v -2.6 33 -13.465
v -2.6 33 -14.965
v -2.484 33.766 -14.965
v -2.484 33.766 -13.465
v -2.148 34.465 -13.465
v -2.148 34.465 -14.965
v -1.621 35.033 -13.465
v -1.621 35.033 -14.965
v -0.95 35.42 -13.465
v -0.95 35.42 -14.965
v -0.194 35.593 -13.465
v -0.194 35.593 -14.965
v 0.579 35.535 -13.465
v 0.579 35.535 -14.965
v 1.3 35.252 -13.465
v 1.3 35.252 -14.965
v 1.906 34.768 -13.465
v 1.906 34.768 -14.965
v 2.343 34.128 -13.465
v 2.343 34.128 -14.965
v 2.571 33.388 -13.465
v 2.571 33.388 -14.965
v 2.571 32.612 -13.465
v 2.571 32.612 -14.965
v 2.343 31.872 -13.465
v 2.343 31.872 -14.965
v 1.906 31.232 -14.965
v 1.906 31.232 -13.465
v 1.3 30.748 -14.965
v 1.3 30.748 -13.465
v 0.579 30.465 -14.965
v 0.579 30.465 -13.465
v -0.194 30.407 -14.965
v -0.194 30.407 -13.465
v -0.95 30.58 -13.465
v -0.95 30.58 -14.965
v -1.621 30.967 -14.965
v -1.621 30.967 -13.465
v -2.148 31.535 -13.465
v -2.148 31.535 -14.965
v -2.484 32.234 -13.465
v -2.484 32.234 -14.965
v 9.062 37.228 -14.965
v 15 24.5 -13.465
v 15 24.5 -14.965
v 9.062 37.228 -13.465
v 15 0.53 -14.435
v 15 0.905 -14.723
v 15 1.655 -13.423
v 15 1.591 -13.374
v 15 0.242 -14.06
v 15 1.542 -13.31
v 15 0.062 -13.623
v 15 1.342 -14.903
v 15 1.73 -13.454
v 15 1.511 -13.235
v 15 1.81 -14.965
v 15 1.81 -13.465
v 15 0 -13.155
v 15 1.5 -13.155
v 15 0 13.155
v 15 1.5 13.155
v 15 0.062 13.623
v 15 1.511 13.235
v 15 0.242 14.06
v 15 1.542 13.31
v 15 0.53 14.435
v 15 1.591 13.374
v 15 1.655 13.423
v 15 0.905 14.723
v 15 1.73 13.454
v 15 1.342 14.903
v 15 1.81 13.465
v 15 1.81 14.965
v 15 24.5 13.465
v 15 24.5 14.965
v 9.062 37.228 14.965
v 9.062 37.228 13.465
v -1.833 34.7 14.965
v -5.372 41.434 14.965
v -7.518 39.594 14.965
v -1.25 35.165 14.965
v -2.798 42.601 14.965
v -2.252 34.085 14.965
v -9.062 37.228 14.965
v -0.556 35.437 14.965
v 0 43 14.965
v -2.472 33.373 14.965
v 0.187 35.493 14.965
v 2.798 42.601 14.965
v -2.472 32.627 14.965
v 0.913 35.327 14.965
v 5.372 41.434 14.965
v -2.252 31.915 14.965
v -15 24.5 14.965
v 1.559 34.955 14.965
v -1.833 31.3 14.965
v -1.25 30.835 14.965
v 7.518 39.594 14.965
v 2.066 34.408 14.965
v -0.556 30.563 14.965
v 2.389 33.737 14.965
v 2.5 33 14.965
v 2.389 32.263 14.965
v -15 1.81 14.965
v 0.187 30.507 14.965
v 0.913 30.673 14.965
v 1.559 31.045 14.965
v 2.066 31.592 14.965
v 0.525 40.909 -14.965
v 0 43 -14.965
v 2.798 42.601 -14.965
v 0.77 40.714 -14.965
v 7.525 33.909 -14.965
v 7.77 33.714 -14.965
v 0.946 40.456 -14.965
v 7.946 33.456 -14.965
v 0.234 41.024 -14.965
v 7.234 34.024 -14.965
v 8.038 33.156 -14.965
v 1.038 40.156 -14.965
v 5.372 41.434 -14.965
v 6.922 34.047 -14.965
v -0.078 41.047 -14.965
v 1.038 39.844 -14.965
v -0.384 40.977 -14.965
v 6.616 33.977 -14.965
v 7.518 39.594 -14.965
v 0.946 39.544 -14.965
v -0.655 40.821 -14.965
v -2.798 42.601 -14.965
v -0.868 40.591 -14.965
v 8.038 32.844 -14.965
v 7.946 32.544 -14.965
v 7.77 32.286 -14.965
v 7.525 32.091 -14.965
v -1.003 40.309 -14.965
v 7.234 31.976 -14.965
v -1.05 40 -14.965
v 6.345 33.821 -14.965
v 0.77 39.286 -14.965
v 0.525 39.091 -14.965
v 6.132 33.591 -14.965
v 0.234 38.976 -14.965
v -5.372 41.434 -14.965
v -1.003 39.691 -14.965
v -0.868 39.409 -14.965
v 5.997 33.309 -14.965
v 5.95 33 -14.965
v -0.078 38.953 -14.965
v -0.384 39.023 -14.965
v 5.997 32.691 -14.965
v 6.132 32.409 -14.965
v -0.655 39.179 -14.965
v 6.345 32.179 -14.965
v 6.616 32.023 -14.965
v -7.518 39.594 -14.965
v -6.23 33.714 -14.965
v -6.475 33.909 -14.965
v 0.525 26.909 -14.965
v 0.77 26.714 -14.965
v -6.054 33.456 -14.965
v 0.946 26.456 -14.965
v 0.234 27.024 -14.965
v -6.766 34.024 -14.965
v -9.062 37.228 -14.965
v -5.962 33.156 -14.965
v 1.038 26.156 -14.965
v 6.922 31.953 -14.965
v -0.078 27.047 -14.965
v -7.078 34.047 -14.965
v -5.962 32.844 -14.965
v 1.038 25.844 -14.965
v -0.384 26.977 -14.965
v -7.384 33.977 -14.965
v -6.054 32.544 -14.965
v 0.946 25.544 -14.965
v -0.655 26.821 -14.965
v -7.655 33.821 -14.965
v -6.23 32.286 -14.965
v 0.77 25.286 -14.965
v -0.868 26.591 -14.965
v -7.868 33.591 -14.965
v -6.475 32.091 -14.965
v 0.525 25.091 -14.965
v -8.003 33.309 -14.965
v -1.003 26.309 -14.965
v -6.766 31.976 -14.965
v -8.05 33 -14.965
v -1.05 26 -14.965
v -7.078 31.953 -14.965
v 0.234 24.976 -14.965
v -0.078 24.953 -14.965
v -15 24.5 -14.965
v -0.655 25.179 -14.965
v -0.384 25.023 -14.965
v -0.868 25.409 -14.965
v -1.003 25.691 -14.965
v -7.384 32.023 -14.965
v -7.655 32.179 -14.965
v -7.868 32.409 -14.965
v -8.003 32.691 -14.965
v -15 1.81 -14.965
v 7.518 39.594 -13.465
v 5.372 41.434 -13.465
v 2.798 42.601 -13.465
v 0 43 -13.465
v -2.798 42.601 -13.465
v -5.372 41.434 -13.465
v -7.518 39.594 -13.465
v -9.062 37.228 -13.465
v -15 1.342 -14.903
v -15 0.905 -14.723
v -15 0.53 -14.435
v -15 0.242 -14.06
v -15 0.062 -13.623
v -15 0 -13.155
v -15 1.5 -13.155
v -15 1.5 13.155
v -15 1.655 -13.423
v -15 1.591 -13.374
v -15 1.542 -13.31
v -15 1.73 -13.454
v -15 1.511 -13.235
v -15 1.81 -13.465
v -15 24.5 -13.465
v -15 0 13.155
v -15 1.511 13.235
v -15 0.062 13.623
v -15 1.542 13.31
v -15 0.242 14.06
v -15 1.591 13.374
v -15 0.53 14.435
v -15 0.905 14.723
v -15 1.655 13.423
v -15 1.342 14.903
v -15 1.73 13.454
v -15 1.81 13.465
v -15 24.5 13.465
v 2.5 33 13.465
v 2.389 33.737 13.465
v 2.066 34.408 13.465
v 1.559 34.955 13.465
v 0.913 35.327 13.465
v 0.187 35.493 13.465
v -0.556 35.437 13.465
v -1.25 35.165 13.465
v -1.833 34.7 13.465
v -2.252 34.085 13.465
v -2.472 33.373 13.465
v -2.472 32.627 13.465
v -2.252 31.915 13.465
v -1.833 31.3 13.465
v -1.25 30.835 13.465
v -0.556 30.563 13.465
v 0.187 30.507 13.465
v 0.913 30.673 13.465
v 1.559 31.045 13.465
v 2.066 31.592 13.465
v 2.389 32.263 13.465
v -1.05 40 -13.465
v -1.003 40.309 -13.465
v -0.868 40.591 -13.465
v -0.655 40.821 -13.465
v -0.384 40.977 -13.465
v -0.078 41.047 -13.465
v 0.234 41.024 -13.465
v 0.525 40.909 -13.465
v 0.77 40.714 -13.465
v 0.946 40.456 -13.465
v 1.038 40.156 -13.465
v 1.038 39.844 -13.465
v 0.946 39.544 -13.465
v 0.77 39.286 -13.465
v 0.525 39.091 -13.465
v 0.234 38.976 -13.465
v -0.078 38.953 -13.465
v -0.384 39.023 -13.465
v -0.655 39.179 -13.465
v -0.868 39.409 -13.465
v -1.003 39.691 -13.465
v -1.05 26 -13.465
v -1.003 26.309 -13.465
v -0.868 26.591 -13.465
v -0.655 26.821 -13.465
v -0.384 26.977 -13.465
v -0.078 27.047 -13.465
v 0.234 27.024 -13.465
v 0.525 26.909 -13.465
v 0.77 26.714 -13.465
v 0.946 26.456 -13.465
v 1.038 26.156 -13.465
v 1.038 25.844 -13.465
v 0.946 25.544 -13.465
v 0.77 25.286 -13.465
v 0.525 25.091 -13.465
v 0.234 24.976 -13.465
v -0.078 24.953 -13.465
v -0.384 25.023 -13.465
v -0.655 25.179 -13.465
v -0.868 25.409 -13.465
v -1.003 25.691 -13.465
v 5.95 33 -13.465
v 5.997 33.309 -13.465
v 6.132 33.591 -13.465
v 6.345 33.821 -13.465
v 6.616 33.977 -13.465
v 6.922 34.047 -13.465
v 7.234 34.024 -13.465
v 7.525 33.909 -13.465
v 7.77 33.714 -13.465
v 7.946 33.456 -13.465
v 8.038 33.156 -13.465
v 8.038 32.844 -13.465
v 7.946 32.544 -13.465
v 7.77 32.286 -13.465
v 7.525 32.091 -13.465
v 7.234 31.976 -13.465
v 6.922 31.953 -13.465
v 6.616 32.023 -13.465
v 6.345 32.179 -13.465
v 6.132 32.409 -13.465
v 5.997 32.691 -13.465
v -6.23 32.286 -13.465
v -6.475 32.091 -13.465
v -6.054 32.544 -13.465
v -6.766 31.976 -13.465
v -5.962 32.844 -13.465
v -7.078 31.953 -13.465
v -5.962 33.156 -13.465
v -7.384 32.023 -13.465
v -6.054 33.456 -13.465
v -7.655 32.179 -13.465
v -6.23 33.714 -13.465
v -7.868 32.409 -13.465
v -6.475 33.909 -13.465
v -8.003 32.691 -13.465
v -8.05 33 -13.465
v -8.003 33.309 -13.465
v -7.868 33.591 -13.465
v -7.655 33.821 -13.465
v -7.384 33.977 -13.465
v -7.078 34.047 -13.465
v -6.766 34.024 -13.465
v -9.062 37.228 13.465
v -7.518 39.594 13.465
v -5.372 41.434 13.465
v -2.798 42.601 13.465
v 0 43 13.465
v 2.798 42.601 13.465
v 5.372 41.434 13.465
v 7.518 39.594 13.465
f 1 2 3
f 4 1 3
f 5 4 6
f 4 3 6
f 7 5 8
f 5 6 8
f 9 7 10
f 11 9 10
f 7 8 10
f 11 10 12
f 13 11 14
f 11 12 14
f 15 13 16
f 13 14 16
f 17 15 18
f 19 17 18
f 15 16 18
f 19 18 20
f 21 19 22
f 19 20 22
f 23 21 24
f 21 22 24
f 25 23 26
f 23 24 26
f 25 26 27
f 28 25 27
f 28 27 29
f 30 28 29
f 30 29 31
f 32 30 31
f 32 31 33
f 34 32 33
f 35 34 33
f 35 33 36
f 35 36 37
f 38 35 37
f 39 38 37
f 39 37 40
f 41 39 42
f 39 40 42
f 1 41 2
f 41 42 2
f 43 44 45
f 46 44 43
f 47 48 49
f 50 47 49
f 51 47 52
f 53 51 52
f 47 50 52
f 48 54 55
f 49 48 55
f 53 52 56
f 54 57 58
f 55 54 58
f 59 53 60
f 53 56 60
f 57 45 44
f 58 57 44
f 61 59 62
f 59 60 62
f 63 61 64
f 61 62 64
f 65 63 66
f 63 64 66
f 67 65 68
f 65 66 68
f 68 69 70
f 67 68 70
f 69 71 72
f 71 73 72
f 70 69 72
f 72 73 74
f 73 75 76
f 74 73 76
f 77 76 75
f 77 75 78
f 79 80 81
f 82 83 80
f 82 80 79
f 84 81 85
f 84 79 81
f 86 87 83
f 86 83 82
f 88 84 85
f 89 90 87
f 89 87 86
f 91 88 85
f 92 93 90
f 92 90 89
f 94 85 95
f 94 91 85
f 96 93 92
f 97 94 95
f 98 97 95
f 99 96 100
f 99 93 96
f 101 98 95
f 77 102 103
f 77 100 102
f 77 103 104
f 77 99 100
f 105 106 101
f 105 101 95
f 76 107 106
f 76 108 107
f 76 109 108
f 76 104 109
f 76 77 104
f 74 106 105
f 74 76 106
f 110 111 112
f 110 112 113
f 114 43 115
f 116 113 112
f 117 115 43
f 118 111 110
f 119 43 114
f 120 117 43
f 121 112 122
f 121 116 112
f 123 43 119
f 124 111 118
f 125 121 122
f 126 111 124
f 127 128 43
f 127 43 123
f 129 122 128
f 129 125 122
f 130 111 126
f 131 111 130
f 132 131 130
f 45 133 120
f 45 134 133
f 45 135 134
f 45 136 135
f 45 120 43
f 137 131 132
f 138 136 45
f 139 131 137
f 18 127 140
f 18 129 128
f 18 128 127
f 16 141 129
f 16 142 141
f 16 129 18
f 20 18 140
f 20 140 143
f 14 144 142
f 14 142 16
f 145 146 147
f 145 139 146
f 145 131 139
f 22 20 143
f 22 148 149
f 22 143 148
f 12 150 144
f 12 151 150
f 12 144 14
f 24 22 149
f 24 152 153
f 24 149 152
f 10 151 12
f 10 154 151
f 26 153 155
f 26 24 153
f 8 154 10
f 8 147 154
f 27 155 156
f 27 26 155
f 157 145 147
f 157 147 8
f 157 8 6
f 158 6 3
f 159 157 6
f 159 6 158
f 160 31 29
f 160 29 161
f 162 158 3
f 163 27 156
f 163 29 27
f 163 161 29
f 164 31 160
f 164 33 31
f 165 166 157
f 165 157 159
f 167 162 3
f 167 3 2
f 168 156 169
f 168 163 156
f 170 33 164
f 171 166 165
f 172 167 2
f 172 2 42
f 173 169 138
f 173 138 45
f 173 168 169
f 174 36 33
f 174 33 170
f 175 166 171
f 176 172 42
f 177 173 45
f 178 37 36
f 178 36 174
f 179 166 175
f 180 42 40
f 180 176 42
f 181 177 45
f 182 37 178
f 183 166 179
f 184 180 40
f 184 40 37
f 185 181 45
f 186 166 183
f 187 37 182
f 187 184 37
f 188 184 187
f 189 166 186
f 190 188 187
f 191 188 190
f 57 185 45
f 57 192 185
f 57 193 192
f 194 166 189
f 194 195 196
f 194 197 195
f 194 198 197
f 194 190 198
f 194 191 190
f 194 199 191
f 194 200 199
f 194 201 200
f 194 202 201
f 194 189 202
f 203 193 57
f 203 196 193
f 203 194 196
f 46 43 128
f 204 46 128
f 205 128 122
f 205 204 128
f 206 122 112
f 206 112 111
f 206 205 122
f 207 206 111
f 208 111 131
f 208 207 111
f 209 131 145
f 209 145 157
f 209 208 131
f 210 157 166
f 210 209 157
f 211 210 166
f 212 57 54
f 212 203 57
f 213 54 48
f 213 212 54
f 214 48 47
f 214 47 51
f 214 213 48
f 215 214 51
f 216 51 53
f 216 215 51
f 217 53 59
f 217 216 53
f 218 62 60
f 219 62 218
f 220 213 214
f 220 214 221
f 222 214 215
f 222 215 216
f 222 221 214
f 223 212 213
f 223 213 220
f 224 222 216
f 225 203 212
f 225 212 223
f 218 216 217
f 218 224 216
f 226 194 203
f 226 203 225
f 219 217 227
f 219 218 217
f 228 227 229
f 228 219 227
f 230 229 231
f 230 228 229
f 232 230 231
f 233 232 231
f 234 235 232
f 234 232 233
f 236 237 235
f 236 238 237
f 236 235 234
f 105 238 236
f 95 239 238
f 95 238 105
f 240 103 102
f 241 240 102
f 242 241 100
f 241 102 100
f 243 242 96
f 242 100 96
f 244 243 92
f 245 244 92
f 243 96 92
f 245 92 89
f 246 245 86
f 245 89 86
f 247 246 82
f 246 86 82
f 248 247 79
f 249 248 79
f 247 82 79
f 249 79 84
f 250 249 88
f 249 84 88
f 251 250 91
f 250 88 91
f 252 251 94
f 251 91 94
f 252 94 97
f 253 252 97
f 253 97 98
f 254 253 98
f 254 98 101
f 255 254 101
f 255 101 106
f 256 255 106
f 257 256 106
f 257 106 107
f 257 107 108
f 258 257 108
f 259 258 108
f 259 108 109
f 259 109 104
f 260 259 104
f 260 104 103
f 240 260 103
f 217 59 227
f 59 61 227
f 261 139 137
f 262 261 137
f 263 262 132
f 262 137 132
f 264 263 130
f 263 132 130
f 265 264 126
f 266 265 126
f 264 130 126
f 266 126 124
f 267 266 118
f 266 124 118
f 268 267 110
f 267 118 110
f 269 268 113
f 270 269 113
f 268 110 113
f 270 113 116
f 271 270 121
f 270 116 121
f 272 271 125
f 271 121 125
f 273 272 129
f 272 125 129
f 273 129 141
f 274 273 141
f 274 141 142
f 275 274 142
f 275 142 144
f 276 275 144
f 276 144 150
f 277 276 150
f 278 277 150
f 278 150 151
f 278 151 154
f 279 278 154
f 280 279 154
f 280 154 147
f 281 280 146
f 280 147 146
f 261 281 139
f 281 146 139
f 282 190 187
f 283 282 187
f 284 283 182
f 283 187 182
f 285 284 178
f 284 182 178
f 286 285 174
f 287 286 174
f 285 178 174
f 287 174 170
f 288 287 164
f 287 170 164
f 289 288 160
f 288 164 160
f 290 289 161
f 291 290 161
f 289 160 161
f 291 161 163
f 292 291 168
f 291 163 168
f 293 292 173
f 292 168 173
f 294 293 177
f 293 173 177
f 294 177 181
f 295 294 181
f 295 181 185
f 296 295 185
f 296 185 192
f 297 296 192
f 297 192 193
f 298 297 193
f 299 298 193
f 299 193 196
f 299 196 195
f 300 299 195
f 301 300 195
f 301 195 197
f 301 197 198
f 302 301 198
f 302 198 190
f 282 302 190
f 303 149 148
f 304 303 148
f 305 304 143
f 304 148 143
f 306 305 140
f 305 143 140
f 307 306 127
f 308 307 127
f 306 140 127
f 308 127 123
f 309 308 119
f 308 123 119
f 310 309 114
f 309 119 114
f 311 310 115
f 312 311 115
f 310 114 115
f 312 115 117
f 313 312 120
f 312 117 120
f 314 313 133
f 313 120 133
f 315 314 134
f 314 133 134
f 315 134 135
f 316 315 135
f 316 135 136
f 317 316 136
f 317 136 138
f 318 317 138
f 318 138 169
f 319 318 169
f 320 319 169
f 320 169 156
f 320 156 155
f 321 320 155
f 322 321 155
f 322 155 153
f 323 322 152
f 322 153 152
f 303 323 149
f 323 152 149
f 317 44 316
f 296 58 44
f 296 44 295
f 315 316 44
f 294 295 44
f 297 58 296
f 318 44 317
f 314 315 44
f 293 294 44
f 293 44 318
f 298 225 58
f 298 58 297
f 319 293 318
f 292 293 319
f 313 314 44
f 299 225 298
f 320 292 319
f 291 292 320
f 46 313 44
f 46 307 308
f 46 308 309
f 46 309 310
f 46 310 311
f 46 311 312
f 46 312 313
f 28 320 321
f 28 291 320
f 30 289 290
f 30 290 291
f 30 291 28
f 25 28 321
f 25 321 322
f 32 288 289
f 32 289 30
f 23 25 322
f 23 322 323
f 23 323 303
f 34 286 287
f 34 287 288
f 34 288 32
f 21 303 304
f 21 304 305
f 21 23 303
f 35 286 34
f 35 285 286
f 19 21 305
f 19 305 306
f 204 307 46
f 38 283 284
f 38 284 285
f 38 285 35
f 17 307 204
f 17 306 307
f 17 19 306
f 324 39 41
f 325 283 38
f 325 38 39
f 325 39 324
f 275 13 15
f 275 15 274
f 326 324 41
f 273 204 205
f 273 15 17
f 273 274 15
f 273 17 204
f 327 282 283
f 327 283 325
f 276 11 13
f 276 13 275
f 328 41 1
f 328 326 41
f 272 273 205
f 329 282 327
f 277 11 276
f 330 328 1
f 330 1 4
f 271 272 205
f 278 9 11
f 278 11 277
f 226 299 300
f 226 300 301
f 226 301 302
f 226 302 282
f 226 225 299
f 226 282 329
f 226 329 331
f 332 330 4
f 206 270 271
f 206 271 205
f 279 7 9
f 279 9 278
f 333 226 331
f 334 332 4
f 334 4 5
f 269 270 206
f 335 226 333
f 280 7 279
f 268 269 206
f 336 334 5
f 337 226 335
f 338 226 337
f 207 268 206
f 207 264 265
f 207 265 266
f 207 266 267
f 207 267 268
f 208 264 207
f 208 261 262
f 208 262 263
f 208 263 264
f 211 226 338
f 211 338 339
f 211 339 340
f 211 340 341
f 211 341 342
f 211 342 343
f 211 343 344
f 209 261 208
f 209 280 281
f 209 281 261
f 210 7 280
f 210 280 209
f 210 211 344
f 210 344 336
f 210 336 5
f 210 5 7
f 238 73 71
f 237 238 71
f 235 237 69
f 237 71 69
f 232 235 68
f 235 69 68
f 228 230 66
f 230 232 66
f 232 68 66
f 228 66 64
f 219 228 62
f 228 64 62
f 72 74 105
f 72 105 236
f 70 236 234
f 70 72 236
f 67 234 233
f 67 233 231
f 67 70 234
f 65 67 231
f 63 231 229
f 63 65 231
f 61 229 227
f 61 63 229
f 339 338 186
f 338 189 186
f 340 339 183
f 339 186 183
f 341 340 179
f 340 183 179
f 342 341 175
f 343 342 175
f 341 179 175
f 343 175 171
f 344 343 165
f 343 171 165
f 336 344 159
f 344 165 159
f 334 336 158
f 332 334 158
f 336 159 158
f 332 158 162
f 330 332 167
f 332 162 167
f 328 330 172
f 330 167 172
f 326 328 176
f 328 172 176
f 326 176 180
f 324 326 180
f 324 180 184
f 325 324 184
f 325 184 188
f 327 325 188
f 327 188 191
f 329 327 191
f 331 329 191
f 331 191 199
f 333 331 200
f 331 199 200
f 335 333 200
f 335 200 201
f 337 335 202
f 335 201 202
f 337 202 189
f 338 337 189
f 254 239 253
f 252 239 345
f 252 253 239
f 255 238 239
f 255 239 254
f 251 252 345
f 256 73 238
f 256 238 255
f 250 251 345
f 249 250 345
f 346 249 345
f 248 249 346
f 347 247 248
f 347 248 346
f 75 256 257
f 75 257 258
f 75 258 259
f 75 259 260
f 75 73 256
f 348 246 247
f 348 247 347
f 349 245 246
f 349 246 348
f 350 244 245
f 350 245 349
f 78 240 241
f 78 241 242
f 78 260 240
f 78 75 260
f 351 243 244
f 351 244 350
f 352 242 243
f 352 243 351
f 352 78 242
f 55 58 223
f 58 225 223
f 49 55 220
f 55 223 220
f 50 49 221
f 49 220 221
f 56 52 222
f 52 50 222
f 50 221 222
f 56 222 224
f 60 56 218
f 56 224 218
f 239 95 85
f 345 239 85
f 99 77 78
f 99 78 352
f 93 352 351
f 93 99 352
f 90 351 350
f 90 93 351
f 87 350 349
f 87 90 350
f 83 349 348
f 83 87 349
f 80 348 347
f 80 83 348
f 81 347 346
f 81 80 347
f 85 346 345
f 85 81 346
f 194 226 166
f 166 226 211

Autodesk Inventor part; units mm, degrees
ref_plane "YZ Plane" through (0, 0, 0) normal (1, 0, 0) x (0, 1, 0)
ref_plane "XZ Plane" through (0, 0, 0) normal (0, 1, 0) x (-1, 0, 0)
ref_plane "XY Plane" through (0, 0, 0) normal (0, 0, 1) x (1, 0, 0)
sketch "Sketch1" plane through (0, 0, 0) normal (0, 1, 0) x (-1, 0, 0)
  line L0 (15, 14.965) -> (-15, 14.965)
  line L1 (-15, 14.965) -> (-15, -14.965)
  line L2 (-15, -14.965) -> (15, -14.965)
  line L3 (15, -14.965) -> (15, 14.965)
  point P0 (0, 0)
  dimension "d0" = 29.93
  dimension "d1" = 30
  dimension "d2" = 15
  dimension "d3" = 14.965
extrude "Plate1" add sketch "Sketch1" along normal blind 1.5
sketch "Sketch2" plane through (-15, 0, -13.465) normal (0, 0, -1) x (-1, 0, 0)
  line L0 (-30, 0) -> (0, 0)
  line L1 (0, 0) -> (0, 43)
  line L2 (0, 43) -> (-30, 43)
  line L3 (-30, 43) -> (-30, 0)
edge flange "Flange1" height 43 angle 90 thickness 1.5 bend radius 0.31 thickness toward (0, 0, -1) relief tear relief width 1.5 relief depth 0.75 corner gap 0.31 corner form 0 edges at (0, 1.5, -14.965) (0, 1.5, 14.965) wall of the first edge with corners at (15, 0, -13.465) (-15, 0, -13.465) (-15, 43, -13.465) (15, 43, -13.465)
bend "Bend1"
corner "Corner1"
sketch "Sketch3" plane through (-15, 43, 14.965) normal (0, 0, 1) x (1, 0, 0)
  line L0 (0, 0) -> (30, 0) projected
  line L1 (0, -41.19) -> (0, 0) projected
  circle A0 centre (15, -10) radius 10
  line L2 (0, -18.5) -> (30, -18.5)
  line L3 (30, -18.5) -> (30, -28.5)
  line L4 (30, -28.5) -> (0, -28.5)
  line L5 (0, -28.5) -> (0, -18.5)
  line L6 (30, -18.5) -> (24.0624, -5.7723)
  line L7 (0, -18.5) -> (5.9376, -5.7723)
  line L8 (0, 0) -> (30, 0)
  line L9 (30, 0) -> (30, -25)
  line L10 (30, -25) -> (0, -25)
  line L11 (0, -25) -> (0, 0)
  point P0 (15, -43)
  point P1 (15, 0)
  dimension "d15" = 10
  dimension "d16" = 0
  dimension "d17" = 20
  dimension "d18" = 8.5
  dimension "d19" = 0
  dimension "d20" = 30
  dimension "d21" = 10
  dimension "d22" = 25
extrude "Extrusion1" cut sketch "Sketch3" against normal blind 35 contours L0 A0 L7 L1 | L0 L9 L6 A0
sketch "Sketch4" plane through (15, 1.81, -14.965) normal (0, 0, -1) x (-1, 0, 0)
  arc A0 (24.0624, 35.4177) -> (5.9376, 35.4177) centre (15, 31.19) ccw projected
  circle A1 centre (15, 31.19) radius 2.6
  circle A2 centre (8, 31.19) radius 1.05
  circle A3 centre (22, 31.19) radius 1.05
  circle A4 centre (15, 38.19) radius 1.05
  circle A5 centre (15, 24.19) radius 1.05
  point P0 (15, -1.81)
  dimension "d25" = 5.2
  dimension "d26" = 0
  dimension "d27" = 7
  dimension "d28" = 2.1
  dimension "d29" = 7
  dimension "d30" = 0
  dimension "d31" = 2.1
  dimension "d32" = 0
  dimension "d33" = 7
  dimension "d34" = 2.1
  dimension "d35" = 7
  dimension "d36" = 0
  dimension "d37" = 2.1
extrude "Extrusion2" cut sketch "Sketch4" against normal blind 1.5
sketch "Sketch5" plane through (-15, 1.81, 14.965) normal (0, 0, 1) x (1, 0, 0)
  arc A0 (24.0624, 35.4177) -> (5.9376, 35.4177) centre (15, 31.19) ccw projected
  circle A1 centre (15, 31.19) radius 2.5
  point P0 (15, -1.81)
  dimension "d40" = 5
extrude "Extrusion3" cut sketch "Sketch5" against normal blind 1.5
equation "\"d4\" = Thickness"
equation "\"d5\" = BendReliefWidth"
equation "\"d6\" = BendReliefDepth"
equation "\"d7\" = MinimumRemnant"
equation "\"d8\" = TransitionRadius"
equation "\"d11\" = BendRadius"
equation "\"d12\" = CornerReliefSize"
equation "\"d13\" = GapSize"
equation "\"d14\" = JacobiRadiusSize"
equation "\"BendReliefWidth\" = Thickness"
equation "\"BendReliefDepth\" = 0.5 * Thickness"
equation "\"CornerReliefSize\" = 4 * Thickness"
equation "\"MinimumRemnant\" = 2 * Thickness"
equation "\"TransitionRadius\" = BendRadius"
equation "\"JacobiRadiusSize\" = BendRadius"
equation "\"GapSize\" = Thickness"
equation "\"Thickness\" = 1.5"
equation "\"BendRadius\" = 0.31"
properties part number "partpart" material "Aluminum 6061-AHC"
